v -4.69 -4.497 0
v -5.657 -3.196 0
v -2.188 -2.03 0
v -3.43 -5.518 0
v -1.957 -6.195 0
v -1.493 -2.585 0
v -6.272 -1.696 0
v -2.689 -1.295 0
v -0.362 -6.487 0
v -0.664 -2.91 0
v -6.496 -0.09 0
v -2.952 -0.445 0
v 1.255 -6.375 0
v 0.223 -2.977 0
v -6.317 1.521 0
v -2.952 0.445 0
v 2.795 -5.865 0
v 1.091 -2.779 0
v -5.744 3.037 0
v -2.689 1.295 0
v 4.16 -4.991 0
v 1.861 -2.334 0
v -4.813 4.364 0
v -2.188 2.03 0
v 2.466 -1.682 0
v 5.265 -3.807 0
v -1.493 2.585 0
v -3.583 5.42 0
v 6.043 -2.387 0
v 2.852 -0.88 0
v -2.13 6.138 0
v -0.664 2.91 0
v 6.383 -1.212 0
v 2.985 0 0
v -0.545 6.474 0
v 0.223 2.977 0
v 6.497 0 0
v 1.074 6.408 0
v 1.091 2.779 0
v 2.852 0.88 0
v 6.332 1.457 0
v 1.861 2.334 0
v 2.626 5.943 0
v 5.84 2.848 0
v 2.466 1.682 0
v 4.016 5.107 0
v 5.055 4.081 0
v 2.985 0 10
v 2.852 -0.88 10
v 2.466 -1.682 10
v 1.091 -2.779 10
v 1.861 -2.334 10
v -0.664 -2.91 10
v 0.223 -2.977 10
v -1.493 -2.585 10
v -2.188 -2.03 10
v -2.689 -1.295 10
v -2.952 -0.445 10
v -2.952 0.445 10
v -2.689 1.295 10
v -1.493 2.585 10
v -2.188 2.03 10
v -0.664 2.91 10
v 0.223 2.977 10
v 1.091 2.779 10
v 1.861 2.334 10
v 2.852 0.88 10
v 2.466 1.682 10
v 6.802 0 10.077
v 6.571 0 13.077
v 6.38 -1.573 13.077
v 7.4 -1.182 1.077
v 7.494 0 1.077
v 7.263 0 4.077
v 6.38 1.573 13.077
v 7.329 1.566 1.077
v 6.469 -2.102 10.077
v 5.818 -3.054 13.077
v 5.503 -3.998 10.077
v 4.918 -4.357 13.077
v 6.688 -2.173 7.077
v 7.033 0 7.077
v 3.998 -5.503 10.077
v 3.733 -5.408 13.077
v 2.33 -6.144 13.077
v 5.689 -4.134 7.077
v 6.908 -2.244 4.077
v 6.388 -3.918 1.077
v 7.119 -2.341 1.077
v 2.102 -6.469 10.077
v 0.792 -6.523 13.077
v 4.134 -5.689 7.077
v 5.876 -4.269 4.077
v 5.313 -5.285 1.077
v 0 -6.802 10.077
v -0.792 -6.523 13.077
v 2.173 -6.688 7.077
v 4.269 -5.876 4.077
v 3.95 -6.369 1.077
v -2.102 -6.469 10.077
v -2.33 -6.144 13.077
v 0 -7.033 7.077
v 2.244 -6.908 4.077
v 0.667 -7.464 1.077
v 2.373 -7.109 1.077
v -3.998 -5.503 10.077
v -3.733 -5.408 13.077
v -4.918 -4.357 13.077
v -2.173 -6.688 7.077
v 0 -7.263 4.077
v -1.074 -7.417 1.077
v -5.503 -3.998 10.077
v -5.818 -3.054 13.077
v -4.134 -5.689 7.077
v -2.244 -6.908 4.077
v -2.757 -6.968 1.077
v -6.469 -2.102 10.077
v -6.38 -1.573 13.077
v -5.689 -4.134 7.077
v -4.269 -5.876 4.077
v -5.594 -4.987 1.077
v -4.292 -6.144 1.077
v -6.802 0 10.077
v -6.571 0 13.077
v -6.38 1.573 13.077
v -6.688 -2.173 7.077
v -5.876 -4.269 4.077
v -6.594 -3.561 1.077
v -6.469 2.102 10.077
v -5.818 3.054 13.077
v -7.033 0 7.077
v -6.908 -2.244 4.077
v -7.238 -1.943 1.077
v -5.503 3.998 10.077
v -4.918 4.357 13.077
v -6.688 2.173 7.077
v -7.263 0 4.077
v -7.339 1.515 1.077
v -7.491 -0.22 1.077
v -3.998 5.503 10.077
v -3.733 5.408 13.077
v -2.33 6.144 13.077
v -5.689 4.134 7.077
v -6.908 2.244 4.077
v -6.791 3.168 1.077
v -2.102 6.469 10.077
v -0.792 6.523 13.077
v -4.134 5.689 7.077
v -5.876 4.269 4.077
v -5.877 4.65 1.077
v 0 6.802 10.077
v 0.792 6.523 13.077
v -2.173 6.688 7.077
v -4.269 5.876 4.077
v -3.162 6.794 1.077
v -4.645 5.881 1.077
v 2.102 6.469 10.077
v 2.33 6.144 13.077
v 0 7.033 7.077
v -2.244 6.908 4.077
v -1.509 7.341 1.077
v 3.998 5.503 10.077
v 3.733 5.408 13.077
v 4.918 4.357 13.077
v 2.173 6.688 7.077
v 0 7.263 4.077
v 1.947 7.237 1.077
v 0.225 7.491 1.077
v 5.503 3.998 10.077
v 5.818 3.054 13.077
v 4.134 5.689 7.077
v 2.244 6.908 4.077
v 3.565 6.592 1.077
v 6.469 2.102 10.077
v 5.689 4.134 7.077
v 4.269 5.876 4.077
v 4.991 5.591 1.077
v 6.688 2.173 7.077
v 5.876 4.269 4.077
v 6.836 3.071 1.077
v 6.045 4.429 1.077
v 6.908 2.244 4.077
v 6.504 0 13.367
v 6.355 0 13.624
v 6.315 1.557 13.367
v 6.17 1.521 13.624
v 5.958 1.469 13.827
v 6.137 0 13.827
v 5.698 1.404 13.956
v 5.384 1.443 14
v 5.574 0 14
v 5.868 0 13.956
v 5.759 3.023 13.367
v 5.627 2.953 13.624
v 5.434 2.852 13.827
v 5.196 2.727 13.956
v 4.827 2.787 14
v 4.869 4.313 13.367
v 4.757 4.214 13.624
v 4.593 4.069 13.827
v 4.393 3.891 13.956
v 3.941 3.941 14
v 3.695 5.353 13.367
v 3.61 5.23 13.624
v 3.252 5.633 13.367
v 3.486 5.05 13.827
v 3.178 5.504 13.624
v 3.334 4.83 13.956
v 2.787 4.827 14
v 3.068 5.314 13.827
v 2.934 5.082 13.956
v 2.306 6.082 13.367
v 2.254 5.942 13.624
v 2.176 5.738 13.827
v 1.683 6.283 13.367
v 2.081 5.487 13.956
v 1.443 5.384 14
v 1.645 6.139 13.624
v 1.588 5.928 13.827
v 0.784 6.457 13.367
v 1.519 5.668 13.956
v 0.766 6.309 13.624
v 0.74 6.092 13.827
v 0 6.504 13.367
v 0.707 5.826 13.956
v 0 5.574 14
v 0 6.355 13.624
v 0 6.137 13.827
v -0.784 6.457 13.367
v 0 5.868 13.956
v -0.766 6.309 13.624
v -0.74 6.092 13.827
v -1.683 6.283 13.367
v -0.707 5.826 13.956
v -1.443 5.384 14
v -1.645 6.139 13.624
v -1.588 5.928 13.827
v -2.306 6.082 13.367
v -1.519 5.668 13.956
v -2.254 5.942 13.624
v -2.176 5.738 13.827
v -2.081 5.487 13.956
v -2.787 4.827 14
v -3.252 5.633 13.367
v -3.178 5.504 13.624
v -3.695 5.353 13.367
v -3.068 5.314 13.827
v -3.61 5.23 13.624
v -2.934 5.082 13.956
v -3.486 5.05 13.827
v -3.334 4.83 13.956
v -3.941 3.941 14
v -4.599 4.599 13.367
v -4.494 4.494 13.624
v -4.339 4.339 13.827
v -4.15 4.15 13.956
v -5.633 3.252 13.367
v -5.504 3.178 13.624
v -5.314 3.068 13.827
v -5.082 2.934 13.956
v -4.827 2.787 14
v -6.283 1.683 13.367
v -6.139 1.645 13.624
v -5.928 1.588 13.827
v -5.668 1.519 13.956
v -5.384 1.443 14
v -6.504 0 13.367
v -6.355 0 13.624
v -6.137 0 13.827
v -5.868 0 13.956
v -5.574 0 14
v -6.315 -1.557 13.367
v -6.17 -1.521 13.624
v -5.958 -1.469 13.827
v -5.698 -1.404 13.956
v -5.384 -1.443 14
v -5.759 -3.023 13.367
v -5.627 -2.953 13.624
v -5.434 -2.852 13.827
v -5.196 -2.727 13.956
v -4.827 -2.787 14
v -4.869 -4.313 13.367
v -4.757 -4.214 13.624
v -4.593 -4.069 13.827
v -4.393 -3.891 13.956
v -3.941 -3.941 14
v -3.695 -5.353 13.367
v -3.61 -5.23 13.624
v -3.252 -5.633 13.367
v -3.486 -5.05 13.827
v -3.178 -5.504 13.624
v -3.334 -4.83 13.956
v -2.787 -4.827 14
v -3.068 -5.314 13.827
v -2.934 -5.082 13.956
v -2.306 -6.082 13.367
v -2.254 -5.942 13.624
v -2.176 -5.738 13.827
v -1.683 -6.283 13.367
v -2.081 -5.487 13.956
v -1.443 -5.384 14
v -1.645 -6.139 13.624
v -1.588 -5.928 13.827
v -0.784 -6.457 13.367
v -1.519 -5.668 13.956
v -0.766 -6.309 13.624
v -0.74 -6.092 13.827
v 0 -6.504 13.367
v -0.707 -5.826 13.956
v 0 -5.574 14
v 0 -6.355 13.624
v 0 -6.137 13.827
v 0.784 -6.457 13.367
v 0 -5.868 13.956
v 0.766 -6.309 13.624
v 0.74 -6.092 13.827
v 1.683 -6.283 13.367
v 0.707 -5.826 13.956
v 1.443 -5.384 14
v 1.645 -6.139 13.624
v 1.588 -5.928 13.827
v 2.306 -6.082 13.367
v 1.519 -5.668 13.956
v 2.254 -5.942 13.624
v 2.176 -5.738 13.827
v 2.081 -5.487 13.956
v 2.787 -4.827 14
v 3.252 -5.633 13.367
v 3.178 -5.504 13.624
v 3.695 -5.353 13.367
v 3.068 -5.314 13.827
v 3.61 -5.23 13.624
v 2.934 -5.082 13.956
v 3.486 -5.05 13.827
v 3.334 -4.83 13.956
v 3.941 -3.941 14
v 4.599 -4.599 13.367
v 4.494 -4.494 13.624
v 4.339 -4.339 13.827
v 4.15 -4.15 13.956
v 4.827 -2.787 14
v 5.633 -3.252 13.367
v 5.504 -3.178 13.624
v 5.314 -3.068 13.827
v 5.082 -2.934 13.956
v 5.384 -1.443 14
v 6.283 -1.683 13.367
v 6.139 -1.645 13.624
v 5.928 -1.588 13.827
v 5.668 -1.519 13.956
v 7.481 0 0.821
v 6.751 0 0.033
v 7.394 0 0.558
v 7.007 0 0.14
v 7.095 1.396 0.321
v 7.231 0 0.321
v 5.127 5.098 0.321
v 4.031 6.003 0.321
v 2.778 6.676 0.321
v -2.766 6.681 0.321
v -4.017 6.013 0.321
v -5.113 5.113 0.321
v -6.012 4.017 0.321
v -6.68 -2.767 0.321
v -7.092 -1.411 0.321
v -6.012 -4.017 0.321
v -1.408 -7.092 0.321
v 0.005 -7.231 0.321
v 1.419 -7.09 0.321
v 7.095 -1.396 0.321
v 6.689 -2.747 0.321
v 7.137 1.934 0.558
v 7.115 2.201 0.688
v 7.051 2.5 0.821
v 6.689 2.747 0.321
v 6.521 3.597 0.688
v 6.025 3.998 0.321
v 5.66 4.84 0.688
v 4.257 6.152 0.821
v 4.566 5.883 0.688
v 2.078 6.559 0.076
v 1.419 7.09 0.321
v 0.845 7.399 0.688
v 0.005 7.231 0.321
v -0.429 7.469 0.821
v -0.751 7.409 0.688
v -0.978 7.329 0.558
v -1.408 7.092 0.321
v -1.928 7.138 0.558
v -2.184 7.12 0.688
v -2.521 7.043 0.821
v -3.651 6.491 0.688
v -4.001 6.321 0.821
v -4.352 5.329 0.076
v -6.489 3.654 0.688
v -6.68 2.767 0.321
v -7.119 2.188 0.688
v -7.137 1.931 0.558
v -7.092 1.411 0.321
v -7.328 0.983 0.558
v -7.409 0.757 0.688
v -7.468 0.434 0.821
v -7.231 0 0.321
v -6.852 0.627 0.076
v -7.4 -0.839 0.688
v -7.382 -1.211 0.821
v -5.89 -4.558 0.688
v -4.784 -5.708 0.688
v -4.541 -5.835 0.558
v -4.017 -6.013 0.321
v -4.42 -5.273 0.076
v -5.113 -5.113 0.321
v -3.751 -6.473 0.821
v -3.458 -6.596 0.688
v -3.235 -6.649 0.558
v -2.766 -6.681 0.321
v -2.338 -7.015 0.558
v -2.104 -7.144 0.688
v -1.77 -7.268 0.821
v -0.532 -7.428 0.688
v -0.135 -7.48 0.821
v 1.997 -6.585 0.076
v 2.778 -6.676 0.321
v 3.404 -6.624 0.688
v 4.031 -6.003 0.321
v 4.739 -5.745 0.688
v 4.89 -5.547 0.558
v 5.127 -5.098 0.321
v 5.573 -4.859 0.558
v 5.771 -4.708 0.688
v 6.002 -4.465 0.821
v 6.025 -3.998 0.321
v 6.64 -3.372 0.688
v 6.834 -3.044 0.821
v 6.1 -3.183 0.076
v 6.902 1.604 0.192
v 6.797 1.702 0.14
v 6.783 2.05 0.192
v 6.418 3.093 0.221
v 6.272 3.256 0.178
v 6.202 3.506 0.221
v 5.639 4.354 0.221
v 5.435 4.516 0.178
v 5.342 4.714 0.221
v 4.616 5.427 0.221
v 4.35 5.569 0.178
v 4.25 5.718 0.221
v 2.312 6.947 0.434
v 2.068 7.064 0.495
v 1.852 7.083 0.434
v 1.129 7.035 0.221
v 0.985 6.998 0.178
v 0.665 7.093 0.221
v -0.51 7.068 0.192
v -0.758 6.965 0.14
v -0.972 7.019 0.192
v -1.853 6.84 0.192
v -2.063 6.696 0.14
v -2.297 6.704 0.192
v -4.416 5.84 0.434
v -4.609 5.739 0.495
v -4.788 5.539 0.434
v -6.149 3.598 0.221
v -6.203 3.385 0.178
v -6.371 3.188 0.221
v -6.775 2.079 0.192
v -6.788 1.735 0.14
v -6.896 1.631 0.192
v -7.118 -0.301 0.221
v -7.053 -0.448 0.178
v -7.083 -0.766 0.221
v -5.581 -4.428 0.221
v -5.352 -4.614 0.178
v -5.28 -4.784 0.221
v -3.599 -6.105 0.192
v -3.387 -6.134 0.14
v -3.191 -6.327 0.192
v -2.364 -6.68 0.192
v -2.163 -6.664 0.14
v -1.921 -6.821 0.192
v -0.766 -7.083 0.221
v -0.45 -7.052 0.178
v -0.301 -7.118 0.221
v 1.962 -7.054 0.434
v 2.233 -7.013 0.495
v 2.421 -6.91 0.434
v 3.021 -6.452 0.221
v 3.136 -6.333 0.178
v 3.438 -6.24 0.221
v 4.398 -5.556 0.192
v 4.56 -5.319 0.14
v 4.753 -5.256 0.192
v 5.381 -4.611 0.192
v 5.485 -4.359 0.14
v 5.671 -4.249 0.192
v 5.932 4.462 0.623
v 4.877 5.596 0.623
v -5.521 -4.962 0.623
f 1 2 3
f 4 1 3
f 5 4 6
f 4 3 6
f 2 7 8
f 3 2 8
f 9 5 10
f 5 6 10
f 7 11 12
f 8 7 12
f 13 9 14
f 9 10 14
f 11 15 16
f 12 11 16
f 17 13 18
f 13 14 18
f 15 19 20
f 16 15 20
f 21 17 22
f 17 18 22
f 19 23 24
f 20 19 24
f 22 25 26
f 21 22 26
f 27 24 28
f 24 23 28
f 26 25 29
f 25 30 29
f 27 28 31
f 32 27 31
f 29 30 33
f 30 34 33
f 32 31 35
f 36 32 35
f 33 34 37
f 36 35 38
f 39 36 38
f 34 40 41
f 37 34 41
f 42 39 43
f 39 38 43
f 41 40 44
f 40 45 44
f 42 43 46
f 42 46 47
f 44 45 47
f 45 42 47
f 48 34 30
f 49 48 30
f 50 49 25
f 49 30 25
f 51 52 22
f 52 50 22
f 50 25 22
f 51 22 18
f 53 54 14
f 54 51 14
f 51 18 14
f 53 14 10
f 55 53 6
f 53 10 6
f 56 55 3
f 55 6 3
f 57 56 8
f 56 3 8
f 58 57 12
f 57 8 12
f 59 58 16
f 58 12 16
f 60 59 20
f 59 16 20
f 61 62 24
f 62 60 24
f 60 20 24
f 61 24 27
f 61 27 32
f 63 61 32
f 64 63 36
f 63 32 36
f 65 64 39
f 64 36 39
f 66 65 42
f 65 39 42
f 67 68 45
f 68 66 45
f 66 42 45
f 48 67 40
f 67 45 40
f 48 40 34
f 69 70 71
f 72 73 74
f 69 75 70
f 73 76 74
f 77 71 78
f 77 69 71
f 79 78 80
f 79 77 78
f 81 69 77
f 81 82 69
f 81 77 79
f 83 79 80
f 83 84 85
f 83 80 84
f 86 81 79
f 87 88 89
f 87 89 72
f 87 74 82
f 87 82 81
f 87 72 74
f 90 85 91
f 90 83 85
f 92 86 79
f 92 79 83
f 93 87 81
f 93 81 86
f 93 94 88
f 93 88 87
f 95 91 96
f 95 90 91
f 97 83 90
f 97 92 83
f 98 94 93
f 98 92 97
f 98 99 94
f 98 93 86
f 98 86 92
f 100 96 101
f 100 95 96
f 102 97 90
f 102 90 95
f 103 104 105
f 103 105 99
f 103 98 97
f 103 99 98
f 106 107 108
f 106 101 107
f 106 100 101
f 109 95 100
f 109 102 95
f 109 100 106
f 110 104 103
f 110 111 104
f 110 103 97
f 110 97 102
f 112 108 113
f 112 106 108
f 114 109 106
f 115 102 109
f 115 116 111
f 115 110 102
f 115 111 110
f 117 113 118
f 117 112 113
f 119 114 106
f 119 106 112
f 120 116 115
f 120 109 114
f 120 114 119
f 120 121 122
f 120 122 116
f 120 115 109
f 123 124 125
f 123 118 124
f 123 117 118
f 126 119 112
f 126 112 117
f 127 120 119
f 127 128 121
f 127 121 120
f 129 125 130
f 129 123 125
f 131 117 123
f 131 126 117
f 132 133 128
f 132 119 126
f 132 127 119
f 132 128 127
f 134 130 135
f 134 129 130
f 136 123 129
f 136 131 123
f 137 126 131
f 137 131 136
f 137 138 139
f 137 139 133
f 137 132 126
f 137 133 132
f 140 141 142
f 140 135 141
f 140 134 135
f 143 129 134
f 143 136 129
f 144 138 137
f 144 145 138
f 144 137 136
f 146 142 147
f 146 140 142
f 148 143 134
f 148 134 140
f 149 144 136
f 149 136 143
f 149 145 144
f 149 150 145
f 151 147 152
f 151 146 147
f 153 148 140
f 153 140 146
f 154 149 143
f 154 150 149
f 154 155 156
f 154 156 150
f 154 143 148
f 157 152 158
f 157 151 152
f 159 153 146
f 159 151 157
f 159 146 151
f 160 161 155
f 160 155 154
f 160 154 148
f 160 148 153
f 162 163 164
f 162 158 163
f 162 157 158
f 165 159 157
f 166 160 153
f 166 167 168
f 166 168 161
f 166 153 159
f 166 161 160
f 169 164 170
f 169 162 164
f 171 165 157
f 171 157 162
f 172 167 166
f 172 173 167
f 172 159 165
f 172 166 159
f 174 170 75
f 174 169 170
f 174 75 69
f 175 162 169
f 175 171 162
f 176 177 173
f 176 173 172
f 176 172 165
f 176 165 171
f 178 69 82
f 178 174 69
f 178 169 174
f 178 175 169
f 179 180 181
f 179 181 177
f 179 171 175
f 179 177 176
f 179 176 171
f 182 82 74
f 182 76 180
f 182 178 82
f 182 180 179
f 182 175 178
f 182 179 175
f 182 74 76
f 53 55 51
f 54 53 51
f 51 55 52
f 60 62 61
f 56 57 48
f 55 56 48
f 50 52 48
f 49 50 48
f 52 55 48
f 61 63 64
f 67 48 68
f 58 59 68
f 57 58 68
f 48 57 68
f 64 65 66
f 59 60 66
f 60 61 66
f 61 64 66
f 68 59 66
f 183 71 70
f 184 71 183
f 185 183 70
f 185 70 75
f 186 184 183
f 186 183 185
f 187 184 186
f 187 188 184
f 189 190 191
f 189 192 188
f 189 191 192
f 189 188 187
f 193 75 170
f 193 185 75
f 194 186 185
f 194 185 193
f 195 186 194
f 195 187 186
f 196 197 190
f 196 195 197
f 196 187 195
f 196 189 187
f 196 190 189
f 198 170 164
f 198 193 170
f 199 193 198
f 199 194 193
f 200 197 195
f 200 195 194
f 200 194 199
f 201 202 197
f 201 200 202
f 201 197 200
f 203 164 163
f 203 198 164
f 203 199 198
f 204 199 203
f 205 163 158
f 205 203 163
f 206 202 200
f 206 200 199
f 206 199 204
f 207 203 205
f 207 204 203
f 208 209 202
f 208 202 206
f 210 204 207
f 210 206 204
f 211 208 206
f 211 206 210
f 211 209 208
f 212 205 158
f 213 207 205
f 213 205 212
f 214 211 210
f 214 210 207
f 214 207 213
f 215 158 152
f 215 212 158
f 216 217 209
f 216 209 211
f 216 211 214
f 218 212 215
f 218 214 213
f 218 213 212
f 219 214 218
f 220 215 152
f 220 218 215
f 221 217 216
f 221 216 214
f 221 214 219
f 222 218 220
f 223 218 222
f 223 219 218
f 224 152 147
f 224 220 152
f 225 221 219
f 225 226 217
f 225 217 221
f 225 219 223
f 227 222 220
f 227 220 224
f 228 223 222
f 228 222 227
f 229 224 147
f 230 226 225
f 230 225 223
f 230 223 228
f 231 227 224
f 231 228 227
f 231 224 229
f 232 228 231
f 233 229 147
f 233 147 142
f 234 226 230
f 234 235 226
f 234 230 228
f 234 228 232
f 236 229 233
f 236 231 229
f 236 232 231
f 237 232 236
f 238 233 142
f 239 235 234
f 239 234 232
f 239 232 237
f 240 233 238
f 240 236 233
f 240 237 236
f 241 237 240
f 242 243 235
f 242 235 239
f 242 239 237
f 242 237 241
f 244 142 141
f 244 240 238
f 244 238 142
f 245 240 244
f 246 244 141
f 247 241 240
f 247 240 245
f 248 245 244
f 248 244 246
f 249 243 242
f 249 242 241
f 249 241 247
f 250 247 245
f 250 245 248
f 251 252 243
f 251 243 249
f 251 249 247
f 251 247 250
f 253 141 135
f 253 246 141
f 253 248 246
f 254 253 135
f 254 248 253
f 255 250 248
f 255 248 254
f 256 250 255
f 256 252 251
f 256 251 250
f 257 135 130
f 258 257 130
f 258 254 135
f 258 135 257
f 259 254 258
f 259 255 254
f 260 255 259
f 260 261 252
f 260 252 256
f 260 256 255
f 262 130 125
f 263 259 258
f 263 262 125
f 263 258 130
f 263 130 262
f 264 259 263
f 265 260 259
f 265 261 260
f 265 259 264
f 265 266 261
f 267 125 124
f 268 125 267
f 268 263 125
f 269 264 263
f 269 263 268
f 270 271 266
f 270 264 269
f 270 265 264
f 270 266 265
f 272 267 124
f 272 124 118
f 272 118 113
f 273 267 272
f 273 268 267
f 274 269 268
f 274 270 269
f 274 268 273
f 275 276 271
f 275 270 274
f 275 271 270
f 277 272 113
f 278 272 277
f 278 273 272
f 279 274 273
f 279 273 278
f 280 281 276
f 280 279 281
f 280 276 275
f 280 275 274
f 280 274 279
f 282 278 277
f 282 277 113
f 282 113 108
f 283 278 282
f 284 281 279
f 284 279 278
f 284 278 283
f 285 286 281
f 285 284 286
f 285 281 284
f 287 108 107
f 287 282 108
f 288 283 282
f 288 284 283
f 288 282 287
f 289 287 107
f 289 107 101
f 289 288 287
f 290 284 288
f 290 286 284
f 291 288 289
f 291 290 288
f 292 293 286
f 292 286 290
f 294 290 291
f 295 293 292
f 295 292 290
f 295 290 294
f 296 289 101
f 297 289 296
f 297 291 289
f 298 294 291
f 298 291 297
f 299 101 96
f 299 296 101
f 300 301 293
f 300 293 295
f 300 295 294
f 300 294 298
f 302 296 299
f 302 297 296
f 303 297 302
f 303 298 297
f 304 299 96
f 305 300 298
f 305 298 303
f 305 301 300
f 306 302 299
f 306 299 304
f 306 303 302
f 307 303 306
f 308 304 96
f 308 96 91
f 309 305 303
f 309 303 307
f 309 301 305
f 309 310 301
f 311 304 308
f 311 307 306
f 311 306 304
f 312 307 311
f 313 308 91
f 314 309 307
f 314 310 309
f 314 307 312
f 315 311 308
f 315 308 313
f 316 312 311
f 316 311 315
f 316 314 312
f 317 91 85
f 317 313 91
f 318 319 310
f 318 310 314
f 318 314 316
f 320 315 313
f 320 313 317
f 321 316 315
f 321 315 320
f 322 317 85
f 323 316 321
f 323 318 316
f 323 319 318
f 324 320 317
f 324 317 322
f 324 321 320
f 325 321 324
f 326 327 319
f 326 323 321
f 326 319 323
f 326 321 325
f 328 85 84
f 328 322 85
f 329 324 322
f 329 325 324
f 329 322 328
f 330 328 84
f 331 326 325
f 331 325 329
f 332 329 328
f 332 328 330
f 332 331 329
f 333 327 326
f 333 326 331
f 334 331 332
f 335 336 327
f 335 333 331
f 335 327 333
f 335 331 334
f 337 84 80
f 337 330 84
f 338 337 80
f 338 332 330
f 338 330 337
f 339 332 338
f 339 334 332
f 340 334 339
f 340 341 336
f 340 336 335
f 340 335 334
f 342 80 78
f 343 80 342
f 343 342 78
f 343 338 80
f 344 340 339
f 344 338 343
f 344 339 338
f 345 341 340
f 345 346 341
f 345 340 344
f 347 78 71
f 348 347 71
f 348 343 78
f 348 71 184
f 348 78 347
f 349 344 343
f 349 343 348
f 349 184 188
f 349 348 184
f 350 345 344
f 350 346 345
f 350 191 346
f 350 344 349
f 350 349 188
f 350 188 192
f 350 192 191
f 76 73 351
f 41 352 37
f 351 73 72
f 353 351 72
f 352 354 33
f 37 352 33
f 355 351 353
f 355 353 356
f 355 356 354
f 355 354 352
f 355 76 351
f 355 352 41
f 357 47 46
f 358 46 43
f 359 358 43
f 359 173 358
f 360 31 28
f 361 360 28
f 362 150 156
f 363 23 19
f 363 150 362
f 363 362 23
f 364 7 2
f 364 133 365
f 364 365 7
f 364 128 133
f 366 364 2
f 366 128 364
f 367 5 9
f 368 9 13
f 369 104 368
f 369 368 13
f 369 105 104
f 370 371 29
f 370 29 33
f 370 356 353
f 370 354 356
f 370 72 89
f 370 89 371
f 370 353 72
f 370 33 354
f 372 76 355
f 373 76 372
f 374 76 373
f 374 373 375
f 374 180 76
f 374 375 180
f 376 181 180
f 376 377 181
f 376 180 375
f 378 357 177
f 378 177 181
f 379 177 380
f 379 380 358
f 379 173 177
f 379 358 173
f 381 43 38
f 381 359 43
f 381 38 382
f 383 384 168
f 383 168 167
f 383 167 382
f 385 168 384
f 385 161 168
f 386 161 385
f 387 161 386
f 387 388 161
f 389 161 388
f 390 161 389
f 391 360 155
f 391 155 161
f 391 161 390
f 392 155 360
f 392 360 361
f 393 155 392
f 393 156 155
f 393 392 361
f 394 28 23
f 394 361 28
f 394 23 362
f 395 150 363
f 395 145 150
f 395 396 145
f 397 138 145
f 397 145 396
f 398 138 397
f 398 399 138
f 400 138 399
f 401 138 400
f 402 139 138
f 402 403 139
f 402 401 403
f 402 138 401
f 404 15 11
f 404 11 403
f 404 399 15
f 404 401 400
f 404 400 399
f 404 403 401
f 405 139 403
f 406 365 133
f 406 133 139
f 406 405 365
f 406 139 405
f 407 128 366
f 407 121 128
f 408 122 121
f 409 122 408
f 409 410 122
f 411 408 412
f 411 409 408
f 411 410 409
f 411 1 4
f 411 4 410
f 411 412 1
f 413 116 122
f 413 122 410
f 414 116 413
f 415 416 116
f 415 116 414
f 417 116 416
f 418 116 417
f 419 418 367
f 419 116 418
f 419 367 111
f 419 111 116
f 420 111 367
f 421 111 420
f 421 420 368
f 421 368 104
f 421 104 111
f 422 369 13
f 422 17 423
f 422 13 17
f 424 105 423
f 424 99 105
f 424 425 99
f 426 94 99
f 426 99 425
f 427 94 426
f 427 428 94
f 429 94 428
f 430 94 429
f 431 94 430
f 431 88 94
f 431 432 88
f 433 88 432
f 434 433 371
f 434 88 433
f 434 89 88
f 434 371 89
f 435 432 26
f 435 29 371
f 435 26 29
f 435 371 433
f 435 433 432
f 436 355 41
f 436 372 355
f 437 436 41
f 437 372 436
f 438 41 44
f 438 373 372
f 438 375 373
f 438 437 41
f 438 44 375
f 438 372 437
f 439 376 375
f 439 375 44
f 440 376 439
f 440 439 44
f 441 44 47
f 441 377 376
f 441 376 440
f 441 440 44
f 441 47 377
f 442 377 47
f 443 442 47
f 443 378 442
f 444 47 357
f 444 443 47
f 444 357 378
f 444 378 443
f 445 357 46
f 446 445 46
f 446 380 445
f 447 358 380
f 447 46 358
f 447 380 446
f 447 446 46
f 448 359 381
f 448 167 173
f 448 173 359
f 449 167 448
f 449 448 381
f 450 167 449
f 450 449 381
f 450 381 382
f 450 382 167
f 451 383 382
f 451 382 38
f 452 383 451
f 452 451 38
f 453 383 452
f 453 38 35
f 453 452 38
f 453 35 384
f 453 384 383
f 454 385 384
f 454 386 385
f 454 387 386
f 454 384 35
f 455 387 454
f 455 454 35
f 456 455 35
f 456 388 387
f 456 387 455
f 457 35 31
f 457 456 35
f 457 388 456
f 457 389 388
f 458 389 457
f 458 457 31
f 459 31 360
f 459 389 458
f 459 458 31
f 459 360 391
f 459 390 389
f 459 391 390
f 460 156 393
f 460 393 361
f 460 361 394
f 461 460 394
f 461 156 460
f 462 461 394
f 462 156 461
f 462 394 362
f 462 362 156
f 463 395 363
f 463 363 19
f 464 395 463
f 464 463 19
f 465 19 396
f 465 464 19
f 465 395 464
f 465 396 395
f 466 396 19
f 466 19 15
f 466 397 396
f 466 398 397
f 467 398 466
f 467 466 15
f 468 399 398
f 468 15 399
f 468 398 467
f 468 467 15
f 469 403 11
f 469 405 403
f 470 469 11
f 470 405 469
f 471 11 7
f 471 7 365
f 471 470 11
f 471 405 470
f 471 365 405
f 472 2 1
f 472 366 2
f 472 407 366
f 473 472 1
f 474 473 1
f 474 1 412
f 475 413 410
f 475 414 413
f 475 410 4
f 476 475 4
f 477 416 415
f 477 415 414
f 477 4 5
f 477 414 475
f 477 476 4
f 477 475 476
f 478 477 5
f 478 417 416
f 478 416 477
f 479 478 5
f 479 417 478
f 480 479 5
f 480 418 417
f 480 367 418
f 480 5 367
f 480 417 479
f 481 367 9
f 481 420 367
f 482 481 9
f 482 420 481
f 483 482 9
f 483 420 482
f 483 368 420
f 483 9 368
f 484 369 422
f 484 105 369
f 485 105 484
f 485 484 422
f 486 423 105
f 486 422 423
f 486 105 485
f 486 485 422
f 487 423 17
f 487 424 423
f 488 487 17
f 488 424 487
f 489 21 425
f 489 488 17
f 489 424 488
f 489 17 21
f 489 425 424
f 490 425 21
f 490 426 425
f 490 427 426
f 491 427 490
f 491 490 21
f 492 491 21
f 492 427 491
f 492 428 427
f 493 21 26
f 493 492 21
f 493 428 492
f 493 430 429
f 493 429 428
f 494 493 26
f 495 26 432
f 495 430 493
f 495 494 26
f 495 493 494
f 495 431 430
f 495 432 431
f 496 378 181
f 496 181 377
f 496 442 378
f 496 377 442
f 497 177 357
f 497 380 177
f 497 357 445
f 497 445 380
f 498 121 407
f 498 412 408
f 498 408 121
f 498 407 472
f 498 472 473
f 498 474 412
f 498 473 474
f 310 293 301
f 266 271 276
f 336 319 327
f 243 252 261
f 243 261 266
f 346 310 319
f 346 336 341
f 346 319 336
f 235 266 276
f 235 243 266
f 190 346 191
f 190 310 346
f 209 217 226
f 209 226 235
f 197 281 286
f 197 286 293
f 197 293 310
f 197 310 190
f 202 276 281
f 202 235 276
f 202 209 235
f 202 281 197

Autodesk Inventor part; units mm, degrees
ref_plane "YZ Plane" through (0, 0, 0) normal (1, 0, 0) x (0, 1, 0)
ref_plane "XZ Plane" through (0, 0, 0) normal (0, 1, 0) x (-1, 0, 0)
ref_plane "XY Plane" through (0, 0, 0) normal (0, 0, 1) x (1, 0, 0)
sketch "Sketch1" plane through (0, 0, 0) normal (0, 0, 1) x (1, 0, 0)
  circle A0 centre (0, 0) radius 7.5
  circle A1 centre (0, 0) radius 2.985
  dimension "d0" = 15
  dimension "d1" = 5.97
extrude "Extrusion1" add sketch "Sketch1" along normal blind 14 contours A0 | A1
extrude "Extrusion2" cut sketch "Sketch1" along normal blind 10 contours A1
chamfer "Chamfer1" distance 1 distance2 13 1 edges at (-7.5, 0, 14) measured on face at (1.2064, -0.2974, 14)
fillet "Fillet1" radius 1 2 edges at (-6.5, 0, 14) (-7.5, 0, 0)
properties part number "Encoder Knobe"
